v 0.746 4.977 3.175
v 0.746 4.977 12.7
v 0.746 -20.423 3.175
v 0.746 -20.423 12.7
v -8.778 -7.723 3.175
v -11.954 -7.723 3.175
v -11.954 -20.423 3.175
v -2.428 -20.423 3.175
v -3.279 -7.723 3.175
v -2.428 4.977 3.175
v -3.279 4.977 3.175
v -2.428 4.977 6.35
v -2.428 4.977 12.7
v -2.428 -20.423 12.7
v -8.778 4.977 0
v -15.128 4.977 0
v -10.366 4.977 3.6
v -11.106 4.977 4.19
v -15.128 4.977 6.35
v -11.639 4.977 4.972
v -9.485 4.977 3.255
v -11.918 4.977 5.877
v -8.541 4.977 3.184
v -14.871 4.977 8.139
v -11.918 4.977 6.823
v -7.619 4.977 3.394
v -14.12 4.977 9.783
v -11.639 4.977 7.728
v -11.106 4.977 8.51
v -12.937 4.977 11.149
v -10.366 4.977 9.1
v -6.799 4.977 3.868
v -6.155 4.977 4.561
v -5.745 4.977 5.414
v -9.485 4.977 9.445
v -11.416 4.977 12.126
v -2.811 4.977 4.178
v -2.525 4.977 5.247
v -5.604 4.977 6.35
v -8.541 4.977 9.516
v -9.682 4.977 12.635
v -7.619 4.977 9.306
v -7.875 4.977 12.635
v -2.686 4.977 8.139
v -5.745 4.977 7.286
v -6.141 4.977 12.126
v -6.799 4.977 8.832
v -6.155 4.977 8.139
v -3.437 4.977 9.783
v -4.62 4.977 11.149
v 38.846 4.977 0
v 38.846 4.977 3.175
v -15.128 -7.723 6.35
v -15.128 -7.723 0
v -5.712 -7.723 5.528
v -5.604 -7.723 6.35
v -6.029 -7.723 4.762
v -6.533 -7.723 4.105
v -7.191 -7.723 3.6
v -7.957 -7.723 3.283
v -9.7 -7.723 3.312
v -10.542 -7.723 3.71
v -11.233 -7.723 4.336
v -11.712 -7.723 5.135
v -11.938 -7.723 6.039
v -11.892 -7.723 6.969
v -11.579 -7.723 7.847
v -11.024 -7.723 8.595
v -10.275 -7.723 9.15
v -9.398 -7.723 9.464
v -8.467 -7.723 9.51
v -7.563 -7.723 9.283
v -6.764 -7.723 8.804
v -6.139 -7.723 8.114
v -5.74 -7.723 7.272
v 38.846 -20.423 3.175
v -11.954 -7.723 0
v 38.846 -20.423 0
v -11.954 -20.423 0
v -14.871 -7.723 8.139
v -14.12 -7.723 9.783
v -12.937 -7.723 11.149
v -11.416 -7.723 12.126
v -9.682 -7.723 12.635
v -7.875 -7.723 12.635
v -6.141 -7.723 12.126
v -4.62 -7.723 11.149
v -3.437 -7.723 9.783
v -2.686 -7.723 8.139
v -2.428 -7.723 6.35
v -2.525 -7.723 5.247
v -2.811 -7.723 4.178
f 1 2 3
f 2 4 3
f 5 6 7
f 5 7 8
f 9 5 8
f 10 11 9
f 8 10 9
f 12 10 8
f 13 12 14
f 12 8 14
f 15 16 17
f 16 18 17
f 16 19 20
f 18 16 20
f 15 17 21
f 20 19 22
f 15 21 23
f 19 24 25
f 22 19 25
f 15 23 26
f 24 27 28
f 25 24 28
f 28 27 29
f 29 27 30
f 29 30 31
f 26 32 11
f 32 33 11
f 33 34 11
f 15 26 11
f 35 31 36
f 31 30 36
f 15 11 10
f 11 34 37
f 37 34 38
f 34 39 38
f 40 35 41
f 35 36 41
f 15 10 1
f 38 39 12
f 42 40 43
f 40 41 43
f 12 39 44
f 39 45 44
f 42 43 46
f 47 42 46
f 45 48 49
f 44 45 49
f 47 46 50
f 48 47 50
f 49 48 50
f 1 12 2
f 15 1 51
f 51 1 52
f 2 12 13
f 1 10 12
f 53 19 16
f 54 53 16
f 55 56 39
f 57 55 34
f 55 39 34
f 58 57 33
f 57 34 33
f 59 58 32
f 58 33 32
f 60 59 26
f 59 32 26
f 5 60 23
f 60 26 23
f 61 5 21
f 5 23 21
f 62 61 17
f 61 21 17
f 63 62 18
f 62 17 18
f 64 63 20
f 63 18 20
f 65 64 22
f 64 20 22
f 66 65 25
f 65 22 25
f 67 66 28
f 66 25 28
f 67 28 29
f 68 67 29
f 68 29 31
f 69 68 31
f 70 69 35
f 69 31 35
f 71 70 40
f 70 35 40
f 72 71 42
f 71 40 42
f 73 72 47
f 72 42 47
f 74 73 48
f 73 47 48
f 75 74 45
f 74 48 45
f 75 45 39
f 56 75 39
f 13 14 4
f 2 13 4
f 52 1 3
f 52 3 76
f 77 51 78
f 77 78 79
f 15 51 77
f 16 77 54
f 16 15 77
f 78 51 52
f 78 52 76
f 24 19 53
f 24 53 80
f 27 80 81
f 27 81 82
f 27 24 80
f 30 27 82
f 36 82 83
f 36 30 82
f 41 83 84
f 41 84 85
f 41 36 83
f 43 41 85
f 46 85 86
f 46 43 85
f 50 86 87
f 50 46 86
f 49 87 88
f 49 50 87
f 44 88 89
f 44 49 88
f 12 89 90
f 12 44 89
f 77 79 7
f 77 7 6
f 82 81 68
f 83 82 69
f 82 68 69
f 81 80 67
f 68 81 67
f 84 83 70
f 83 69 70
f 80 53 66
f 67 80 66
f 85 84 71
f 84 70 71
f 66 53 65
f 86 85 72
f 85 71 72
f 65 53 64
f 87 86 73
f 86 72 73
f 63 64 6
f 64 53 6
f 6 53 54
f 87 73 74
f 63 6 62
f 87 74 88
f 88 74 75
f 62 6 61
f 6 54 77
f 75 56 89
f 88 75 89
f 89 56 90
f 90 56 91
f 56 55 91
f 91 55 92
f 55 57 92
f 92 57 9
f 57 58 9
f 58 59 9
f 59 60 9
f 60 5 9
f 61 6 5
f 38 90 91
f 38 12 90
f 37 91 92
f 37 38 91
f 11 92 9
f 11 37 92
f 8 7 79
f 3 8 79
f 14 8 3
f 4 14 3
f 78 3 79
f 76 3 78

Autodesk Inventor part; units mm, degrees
ref_plane "YZ Plane" through (0, 0, 0) normal (1, 0, 0) x (0, 1, 0)
ref_plane "XZ Plane" through (0, 0, 0) normal (0, 1, 0) x (-1, 0, 0)
ref_plane "XY Plane" through (0, 0, 0) normal (0, 0, 1) x (1, 0, 0)
sketch "Sketch1" plane through (0, 0, 0) normal (0, 0, 1) x (1, 0, 0)
  line L0 (-11.9535, 4.9767) -> (38.8465, 4.9767)
  line L1 (38.8465, 4.9767) -> (38.8465, -20.4233)
  line L2 (38.8465, -20.4233) -> (-11.9535, -20.4233)
  line L3 (-11.9535, -20.4233) -> (-11.9535, 4.9767)
  point P0 (0, 0)
  dimension "d0" = 50.8
  dimension "d1" = 25.4
extrude "Extrusion1" add sketch "Sketch1" along normal blind 3.175
sketch "Sketch2" plane through (-11.9535, 4.9767, 0) normal (0, 1, 0) x (1, 0, 0)
  line L0 (0, -3.175) -> (50.8, -3.175) projected
  line L1 (0, -3.175) -> (3.175, -3.175)
  line L2 (3.175, -3.175) -> (3.175, -6.35)
  circle A0 centre (3.175, -6.35) radius 3.175
  circle A1 centre (3.175, -6.35) radius 4.4901
  point P0 (11.9535, 0)
  dimension "d4" = 3.175
  dimension "d5" = 3.175
extrude "Extrusion2" add sketch "Sketch2" against normal blind 12.7
sketch "Sketch3" plane through (-11.9535, 4.9767, 0) normal (0, 1, 0) x (1, 0, 0)
  line L0 (6.35, -3.175) -> (50.8, -3.175) projected
  arc A0 (0, -3.175) -> (6.35, -3.175) centre (3.175, -6.35) ccw projected
  line L1 (7.6651, -6.35) -> (7.6651, -3.175)
  point P0 (11.9535, 0)
extrude "Extrusion3" add sketch "Sketch3" against normal blind 12.7
sketch "Sketch4" plane through (-11.9535, 4.9767, 0) normal (0, 1, 0) x (1, 0, 0)
  line L0 (7.6651, -3.175) -> (50.8, -3.175) projected
  line L1 (50.8, 0) -> (50.8, -3.175) projected
  line L2 (0, 0) -> (50.8, 0) projected
  line L3 (0, 0) -> (0, -3.175) projected
  arc A0 (0, -3.175) -> (7.6651, -6.35) centre (3.175, -6.35) ccw projected
  line L4 (7.6651, -6.35) -> (7.6651, -3.175) projected
  line L5 (7.6651, -3.175) -> (7.6651, -12.2458)
  line L6 (3.175, -10.8401) -> (7.6651, -10.8401)
  point P0 (11.9535, 0)
extrude "Extrusion4" add sketch "Sketch4" against normal blind 12.7 contours L5 L6 A0
sketch "Sketch5" plane through (-11.9535, 4.9767, 0) normal (0, 1, 0) x (1, 0, 0)
  arc A0 (0, -3.175) -> (3.175, -10.8401) centre (3.175, -6.35) ccw projected
  line L0 (3.175, -10.8401) -> (7.6651, -10.8401) projected
  line L1 (7.6651, -10.8401) -> (7.6651, -3.175) projected
  circle A1 centre (3.175, -6.35) radius 3.175 projected
  line L2 (7.6651, -3.175) -> (0, -3.175)
  point P0 (11.9535, 0)
extrude "Extrusion5" cut sketch "Sketch5" against normal blind 25.4
sketch "Sketch6" plane through (-11.9535, 4.9767, 0) normal (0, 1, 0) x (1, 0, 0)
  line L0 (0, -3.175) -> (50.8, -3.175) projected
  line L1 (0, 0) -> (50.8, 0) projected
  line L2 (0, -3.175) -> (3.175, -3.175)
  line L3 (3.175, -3.175) -> (3.175, -6.35)
  circle A0 centre (3.175, -6.35) radius 3.175
  circle A1 centre (3.175, -6.35) radius 6.35
  point P0 (11.9535, 0)
  dimension "d14" = 3.175
  dimension "d15" = 3.175
extrude "Extrusion6" add sketch "Sketch6" against normal blind 12.7
sketch "Sketch7" plane through (-11.9535, 4.9767, 0) normal (0, 1, 0) x (1, 0, 0)
  line L0 (0, 0) -> (0, -0.8507) projected
  arc A0 (0, -0.8507) -> (8.6743, -3.175) centre (3.175, -6.35) ccw projected
  line L1 (-3.175, -6.35) -> (-3.175, 0)
  line L2 (0, 0) -> (-3.175, 0)
  point P0 (11.9535, 0)
extrude "Extrusion7" add sketch "Sketch7" against normal blind 12.7
sketch "Sketch8" plane through (-11.9535, -20.4233, 0) normal (0, -1, 0) x (1, 0, 0)
  line L0 (50.8, 3.175) -> (0, 3.175) projected
  line L1 (0, 3.175) -> (6.35, 3.175)
  line L2 (6.35, 3.175) -> (9.525, 3.175)
  line L3 (9.525, 3.175) -> (9.525, 12.7)
  line L4 (9.525, 12.7) -> (12.7, 12.7)
  line L5 (12.7, 12.7) -> (12.7, 3.175)
  line L6 (12.7, 3.175) -> (9.525, 3.175)
  line L7 (9.525, 3.175) -> (9.525, 12.7)
  point P0 (11.9535, 0)
  dimension "d20" = 6.35
  dimension "d21" = 3.175
  dimension "d22" = 9.525
  dimension "d23" = 3.175
extrude "Extrusion8" add sketch "Sketch8" against normal blind 25.4
properties part number "hingely"
